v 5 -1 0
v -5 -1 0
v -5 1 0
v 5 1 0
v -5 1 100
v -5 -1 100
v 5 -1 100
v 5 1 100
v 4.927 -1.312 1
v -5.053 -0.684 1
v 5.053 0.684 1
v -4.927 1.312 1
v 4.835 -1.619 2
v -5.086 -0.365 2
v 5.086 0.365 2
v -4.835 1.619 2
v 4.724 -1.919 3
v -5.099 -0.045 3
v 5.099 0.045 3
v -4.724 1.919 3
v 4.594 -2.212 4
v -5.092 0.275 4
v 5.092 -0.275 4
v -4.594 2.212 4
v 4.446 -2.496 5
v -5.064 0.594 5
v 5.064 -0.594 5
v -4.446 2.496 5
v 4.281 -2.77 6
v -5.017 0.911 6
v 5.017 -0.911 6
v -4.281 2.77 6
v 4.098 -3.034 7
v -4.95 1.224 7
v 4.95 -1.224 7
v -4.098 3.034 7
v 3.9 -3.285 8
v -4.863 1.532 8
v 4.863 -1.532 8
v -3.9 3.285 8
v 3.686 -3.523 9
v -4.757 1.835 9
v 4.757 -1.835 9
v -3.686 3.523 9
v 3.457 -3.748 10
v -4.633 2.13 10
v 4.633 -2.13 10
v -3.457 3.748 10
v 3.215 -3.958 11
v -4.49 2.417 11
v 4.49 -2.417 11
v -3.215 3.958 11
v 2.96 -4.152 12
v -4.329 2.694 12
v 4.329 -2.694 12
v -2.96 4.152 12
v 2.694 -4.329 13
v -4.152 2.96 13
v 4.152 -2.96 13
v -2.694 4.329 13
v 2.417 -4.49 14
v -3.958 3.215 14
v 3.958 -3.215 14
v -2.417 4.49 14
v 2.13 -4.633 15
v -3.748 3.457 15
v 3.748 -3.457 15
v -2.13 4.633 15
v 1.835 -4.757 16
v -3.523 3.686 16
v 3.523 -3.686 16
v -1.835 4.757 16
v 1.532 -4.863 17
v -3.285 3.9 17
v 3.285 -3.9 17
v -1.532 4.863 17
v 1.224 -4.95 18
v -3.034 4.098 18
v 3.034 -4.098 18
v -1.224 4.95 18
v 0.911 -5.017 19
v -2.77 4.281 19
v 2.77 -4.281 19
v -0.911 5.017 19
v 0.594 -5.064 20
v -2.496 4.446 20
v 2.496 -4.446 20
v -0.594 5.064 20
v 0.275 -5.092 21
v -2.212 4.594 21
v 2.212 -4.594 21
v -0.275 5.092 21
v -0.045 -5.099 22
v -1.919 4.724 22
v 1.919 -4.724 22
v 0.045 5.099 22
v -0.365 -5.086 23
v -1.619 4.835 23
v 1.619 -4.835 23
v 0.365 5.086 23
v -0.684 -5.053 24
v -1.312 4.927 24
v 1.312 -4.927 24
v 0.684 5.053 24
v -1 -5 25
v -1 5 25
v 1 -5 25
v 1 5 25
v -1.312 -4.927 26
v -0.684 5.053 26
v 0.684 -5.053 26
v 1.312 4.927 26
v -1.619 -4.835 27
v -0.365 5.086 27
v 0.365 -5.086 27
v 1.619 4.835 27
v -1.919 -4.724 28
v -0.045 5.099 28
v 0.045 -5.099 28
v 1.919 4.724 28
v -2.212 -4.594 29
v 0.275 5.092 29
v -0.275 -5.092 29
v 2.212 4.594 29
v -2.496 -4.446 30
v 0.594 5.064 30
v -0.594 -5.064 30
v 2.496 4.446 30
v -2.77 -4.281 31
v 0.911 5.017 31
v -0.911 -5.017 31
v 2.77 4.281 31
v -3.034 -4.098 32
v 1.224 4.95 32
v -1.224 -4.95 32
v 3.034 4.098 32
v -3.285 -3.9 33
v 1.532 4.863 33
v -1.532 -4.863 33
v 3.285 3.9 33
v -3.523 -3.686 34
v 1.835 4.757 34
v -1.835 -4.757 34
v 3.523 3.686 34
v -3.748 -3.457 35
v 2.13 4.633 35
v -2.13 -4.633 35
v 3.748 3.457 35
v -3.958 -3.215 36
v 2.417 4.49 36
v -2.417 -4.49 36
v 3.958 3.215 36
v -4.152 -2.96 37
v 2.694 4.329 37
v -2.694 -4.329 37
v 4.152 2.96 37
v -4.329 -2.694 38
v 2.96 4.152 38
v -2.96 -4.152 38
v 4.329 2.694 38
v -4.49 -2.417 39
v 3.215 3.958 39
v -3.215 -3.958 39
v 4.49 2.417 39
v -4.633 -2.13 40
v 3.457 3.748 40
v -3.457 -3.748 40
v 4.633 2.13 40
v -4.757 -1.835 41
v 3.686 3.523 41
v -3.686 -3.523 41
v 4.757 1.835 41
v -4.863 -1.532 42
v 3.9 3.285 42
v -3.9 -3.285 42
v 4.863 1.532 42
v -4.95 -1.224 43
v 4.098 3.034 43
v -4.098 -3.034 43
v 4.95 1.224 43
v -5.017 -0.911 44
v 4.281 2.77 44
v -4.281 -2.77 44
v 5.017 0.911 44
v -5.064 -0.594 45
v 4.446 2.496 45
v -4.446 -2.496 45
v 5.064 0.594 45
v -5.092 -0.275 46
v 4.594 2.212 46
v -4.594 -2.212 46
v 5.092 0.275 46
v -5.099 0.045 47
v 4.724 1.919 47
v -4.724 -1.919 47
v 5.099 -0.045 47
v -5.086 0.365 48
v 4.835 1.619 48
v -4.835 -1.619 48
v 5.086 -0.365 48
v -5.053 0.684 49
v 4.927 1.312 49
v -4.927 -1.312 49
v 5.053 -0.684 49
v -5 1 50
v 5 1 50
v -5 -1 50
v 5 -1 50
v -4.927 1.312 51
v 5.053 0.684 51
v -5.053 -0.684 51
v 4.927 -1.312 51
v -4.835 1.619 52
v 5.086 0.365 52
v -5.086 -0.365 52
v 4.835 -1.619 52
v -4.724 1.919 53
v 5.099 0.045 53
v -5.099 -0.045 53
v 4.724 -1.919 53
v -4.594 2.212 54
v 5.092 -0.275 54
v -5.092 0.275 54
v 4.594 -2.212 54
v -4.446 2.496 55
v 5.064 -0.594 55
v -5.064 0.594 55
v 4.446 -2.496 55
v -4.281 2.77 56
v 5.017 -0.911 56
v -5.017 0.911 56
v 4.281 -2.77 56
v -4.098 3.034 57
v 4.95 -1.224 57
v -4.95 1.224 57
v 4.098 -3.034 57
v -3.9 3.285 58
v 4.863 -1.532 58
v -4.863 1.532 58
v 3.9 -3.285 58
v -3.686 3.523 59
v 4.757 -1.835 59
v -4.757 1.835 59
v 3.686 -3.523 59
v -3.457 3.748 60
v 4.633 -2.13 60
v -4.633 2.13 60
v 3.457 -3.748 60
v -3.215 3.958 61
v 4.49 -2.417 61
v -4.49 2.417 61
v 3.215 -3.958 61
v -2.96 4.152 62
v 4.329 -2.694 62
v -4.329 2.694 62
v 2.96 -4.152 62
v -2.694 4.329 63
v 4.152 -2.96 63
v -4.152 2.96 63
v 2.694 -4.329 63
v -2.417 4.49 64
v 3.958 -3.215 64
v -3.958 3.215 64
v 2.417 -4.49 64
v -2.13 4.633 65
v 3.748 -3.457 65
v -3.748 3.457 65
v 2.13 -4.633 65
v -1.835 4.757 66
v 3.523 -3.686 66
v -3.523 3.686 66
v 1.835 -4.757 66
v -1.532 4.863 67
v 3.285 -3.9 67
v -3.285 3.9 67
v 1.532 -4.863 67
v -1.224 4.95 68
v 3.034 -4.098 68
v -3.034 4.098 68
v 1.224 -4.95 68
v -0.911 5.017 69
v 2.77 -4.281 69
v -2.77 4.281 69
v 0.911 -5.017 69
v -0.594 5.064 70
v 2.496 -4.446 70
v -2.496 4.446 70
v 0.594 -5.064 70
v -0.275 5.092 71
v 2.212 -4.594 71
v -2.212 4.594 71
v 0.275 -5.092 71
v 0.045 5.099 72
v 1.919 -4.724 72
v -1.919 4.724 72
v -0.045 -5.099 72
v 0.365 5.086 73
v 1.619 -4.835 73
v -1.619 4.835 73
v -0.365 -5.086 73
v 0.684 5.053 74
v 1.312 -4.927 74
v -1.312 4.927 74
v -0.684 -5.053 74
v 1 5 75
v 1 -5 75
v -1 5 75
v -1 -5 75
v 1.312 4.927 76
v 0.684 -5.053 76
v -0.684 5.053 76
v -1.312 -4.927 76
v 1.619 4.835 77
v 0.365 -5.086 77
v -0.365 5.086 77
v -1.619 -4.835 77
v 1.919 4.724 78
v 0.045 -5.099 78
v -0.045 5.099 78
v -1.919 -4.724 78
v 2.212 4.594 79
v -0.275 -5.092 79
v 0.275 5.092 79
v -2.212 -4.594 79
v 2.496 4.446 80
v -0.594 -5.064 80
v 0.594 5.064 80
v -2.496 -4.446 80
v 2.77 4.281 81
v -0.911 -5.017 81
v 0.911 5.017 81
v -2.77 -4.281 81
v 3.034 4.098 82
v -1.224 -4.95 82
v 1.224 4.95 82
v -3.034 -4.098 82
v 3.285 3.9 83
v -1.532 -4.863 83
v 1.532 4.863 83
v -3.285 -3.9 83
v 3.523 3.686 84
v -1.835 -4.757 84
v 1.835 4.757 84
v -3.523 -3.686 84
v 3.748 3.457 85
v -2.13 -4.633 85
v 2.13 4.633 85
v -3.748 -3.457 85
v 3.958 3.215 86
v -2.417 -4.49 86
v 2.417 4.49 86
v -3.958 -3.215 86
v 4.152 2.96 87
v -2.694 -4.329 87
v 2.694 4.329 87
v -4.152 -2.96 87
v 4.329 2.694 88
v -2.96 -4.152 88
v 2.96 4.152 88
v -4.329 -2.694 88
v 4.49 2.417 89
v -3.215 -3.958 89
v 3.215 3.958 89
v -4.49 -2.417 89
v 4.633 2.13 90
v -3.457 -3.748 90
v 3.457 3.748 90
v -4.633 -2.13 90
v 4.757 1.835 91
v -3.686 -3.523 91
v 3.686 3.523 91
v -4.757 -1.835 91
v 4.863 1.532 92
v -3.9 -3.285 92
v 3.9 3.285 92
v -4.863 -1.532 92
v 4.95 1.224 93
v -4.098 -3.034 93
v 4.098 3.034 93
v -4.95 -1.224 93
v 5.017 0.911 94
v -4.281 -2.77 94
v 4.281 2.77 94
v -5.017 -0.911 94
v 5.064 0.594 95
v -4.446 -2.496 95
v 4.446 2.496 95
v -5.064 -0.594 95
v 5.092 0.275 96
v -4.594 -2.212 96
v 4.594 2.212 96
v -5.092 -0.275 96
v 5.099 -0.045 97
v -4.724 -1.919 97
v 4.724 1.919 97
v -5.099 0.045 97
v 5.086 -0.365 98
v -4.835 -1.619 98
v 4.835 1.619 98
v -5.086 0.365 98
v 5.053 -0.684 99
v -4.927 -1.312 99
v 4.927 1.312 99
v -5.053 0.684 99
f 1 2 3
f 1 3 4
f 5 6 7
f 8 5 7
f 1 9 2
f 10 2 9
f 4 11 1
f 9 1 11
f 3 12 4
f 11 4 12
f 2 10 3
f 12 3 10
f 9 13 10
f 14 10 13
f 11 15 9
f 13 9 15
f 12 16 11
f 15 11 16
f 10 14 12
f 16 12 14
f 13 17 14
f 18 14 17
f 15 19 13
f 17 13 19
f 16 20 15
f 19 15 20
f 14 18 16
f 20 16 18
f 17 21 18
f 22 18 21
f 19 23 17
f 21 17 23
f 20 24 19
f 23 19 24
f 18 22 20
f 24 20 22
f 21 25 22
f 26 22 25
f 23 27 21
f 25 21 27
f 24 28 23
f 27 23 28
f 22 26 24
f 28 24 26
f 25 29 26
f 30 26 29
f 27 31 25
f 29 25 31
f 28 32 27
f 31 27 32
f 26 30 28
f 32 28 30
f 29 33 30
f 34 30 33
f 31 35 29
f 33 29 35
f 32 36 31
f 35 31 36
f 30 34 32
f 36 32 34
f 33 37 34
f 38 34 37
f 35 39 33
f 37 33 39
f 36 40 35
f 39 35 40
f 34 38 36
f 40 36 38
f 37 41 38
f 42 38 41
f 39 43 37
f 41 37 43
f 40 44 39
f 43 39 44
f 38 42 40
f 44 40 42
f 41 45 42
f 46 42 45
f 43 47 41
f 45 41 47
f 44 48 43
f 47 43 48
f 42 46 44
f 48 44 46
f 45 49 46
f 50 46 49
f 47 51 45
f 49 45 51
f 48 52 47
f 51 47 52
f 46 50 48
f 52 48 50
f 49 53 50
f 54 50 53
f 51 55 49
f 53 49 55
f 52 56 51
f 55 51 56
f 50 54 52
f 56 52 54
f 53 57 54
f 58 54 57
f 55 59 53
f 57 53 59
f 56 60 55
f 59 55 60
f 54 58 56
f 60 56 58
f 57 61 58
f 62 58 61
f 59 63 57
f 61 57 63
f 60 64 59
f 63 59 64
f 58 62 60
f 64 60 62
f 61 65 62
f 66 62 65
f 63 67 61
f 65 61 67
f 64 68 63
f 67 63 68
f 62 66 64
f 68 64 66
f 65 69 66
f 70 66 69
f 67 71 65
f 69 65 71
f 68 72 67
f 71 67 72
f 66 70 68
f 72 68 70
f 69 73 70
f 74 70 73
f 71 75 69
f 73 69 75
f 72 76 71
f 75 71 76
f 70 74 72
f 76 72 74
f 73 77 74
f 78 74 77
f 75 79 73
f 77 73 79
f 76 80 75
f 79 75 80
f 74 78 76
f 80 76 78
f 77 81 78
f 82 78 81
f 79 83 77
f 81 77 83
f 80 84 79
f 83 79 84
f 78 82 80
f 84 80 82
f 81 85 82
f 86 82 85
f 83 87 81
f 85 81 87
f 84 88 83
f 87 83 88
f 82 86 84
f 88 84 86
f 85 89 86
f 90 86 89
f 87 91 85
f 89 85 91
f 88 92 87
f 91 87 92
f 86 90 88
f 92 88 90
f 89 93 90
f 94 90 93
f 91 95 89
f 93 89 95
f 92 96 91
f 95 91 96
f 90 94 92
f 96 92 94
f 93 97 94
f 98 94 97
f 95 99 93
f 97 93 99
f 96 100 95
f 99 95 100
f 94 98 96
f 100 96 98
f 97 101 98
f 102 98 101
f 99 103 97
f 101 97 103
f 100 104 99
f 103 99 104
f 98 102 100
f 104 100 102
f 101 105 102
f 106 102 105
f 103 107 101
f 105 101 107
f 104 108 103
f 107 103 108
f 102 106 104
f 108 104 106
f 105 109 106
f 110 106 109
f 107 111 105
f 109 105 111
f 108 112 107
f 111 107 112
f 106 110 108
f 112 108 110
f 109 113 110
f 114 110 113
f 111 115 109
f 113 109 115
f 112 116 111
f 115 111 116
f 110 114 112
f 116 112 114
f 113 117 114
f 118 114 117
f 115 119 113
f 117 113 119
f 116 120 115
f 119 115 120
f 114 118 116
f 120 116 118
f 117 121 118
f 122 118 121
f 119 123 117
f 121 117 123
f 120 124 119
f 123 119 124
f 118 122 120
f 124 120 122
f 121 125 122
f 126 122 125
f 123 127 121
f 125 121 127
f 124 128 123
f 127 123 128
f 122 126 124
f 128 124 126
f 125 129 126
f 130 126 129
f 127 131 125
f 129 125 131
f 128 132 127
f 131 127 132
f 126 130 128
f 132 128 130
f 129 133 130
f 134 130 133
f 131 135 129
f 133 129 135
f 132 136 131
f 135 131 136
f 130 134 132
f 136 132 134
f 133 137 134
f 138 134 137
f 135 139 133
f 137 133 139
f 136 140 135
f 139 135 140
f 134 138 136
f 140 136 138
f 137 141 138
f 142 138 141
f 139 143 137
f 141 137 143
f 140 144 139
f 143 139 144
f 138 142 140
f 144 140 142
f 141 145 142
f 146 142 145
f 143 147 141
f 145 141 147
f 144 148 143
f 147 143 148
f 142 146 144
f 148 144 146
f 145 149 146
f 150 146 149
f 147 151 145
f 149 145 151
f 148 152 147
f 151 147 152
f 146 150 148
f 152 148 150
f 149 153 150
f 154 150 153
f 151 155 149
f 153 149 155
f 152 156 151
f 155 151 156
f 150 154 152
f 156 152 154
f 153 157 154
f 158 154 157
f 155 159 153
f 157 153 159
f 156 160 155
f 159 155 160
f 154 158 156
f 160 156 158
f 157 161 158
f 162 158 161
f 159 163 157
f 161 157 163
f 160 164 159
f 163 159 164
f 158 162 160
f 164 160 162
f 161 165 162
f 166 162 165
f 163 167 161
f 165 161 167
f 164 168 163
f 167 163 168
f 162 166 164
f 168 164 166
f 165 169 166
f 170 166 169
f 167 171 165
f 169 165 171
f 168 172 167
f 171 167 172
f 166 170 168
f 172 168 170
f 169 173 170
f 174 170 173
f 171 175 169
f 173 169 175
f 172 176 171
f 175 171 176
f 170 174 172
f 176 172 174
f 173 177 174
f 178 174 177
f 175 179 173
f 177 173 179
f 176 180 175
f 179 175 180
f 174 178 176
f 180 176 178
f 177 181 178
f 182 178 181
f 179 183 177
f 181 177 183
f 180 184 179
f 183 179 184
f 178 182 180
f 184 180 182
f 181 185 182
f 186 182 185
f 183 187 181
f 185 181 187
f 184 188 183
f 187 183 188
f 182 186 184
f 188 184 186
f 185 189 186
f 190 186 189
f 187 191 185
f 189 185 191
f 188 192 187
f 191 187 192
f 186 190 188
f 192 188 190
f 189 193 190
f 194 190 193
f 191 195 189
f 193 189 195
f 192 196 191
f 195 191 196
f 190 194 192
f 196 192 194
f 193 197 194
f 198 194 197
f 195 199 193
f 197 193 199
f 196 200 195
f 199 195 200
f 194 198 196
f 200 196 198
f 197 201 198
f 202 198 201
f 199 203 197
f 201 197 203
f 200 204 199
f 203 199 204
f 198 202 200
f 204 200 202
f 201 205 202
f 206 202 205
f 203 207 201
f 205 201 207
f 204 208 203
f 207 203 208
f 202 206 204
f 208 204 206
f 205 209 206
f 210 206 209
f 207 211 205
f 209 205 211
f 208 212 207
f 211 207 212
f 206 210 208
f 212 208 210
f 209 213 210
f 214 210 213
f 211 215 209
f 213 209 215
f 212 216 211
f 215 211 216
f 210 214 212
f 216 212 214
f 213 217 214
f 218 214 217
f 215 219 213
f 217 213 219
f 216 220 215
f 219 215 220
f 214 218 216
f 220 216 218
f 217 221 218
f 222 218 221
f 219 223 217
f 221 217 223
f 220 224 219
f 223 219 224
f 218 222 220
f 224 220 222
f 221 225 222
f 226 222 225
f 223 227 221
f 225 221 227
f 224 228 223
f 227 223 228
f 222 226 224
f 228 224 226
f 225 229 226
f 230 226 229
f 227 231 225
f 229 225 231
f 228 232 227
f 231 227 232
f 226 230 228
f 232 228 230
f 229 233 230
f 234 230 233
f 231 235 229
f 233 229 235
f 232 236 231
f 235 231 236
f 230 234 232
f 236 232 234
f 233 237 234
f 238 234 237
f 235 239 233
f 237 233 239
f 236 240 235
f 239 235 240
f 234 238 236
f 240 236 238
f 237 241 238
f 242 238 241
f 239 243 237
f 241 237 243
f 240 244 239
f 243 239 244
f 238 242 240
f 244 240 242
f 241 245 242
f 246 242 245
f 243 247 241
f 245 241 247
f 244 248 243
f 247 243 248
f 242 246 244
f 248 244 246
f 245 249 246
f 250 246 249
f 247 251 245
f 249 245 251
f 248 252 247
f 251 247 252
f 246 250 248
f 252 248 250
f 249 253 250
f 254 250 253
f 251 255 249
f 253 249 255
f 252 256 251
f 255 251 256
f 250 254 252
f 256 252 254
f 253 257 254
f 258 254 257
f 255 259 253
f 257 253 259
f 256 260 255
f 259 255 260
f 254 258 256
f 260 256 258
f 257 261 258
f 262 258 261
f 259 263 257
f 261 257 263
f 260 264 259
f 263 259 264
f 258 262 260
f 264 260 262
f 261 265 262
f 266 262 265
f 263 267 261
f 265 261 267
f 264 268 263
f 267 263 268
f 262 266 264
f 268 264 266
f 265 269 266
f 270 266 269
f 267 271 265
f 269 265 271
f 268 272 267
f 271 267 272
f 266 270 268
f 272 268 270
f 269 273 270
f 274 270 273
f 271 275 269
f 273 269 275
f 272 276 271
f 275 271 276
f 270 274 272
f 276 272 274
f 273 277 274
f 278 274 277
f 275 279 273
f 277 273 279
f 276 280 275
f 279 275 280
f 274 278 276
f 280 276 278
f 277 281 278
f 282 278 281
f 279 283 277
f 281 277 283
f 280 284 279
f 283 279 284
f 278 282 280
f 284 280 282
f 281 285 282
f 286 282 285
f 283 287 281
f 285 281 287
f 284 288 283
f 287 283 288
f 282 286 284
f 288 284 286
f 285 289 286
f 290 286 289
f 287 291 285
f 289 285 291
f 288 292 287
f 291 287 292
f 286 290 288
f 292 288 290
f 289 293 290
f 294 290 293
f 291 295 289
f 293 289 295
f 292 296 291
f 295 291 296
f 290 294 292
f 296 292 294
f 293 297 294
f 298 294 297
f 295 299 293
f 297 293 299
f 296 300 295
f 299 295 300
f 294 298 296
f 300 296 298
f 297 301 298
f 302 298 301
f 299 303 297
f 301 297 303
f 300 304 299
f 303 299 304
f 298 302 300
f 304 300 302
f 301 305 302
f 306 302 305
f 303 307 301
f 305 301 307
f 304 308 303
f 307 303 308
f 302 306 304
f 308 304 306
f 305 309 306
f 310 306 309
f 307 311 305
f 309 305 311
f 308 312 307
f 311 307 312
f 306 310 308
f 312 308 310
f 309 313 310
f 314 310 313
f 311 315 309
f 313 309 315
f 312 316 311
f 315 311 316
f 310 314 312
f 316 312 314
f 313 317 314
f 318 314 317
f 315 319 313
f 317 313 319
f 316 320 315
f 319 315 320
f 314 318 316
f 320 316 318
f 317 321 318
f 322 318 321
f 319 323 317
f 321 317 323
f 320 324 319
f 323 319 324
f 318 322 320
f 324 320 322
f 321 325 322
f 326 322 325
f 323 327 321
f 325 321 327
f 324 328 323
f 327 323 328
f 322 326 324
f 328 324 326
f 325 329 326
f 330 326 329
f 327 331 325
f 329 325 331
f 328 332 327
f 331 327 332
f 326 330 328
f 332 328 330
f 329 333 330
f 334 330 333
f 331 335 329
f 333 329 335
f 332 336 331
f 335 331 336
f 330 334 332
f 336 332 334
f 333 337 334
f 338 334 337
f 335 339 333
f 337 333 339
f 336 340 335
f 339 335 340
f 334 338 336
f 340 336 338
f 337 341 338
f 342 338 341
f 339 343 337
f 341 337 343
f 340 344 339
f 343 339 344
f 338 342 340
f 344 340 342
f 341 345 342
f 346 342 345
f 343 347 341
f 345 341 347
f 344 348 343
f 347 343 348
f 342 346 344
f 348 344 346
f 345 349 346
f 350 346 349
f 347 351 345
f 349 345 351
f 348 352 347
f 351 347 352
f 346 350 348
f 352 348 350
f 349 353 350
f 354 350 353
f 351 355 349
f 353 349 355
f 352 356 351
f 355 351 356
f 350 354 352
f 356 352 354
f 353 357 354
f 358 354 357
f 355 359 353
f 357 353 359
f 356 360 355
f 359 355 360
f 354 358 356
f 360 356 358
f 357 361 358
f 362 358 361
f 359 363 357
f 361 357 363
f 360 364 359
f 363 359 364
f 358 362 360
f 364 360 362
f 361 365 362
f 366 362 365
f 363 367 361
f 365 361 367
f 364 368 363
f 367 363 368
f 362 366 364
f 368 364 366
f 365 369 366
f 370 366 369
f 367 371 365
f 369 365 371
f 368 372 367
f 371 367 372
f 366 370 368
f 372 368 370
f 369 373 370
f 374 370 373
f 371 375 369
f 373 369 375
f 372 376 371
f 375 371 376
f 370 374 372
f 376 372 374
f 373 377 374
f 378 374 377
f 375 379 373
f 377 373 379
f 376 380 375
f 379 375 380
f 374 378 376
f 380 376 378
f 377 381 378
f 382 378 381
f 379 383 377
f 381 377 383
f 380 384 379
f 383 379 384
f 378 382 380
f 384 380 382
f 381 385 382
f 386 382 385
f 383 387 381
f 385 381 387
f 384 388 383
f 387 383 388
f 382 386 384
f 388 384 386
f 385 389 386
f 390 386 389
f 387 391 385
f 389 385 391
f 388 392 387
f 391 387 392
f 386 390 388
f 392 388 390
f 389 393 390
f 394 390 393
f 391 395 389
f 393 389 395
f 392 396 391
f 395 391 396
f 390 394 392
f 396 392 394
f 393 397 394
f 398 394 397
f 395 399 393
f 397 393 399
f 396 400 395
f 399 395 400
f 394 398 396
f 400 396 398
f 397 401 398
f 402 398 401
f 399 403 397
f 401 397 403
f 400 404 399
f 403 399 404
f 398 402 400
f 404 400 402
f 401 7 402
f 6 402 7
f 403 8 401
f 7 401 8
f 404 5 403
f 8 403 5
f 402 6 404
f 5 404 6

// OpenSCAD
linear_extrude(height=100,
               twist=360,
               slices=100){
    square([10,2],center=true);
}
